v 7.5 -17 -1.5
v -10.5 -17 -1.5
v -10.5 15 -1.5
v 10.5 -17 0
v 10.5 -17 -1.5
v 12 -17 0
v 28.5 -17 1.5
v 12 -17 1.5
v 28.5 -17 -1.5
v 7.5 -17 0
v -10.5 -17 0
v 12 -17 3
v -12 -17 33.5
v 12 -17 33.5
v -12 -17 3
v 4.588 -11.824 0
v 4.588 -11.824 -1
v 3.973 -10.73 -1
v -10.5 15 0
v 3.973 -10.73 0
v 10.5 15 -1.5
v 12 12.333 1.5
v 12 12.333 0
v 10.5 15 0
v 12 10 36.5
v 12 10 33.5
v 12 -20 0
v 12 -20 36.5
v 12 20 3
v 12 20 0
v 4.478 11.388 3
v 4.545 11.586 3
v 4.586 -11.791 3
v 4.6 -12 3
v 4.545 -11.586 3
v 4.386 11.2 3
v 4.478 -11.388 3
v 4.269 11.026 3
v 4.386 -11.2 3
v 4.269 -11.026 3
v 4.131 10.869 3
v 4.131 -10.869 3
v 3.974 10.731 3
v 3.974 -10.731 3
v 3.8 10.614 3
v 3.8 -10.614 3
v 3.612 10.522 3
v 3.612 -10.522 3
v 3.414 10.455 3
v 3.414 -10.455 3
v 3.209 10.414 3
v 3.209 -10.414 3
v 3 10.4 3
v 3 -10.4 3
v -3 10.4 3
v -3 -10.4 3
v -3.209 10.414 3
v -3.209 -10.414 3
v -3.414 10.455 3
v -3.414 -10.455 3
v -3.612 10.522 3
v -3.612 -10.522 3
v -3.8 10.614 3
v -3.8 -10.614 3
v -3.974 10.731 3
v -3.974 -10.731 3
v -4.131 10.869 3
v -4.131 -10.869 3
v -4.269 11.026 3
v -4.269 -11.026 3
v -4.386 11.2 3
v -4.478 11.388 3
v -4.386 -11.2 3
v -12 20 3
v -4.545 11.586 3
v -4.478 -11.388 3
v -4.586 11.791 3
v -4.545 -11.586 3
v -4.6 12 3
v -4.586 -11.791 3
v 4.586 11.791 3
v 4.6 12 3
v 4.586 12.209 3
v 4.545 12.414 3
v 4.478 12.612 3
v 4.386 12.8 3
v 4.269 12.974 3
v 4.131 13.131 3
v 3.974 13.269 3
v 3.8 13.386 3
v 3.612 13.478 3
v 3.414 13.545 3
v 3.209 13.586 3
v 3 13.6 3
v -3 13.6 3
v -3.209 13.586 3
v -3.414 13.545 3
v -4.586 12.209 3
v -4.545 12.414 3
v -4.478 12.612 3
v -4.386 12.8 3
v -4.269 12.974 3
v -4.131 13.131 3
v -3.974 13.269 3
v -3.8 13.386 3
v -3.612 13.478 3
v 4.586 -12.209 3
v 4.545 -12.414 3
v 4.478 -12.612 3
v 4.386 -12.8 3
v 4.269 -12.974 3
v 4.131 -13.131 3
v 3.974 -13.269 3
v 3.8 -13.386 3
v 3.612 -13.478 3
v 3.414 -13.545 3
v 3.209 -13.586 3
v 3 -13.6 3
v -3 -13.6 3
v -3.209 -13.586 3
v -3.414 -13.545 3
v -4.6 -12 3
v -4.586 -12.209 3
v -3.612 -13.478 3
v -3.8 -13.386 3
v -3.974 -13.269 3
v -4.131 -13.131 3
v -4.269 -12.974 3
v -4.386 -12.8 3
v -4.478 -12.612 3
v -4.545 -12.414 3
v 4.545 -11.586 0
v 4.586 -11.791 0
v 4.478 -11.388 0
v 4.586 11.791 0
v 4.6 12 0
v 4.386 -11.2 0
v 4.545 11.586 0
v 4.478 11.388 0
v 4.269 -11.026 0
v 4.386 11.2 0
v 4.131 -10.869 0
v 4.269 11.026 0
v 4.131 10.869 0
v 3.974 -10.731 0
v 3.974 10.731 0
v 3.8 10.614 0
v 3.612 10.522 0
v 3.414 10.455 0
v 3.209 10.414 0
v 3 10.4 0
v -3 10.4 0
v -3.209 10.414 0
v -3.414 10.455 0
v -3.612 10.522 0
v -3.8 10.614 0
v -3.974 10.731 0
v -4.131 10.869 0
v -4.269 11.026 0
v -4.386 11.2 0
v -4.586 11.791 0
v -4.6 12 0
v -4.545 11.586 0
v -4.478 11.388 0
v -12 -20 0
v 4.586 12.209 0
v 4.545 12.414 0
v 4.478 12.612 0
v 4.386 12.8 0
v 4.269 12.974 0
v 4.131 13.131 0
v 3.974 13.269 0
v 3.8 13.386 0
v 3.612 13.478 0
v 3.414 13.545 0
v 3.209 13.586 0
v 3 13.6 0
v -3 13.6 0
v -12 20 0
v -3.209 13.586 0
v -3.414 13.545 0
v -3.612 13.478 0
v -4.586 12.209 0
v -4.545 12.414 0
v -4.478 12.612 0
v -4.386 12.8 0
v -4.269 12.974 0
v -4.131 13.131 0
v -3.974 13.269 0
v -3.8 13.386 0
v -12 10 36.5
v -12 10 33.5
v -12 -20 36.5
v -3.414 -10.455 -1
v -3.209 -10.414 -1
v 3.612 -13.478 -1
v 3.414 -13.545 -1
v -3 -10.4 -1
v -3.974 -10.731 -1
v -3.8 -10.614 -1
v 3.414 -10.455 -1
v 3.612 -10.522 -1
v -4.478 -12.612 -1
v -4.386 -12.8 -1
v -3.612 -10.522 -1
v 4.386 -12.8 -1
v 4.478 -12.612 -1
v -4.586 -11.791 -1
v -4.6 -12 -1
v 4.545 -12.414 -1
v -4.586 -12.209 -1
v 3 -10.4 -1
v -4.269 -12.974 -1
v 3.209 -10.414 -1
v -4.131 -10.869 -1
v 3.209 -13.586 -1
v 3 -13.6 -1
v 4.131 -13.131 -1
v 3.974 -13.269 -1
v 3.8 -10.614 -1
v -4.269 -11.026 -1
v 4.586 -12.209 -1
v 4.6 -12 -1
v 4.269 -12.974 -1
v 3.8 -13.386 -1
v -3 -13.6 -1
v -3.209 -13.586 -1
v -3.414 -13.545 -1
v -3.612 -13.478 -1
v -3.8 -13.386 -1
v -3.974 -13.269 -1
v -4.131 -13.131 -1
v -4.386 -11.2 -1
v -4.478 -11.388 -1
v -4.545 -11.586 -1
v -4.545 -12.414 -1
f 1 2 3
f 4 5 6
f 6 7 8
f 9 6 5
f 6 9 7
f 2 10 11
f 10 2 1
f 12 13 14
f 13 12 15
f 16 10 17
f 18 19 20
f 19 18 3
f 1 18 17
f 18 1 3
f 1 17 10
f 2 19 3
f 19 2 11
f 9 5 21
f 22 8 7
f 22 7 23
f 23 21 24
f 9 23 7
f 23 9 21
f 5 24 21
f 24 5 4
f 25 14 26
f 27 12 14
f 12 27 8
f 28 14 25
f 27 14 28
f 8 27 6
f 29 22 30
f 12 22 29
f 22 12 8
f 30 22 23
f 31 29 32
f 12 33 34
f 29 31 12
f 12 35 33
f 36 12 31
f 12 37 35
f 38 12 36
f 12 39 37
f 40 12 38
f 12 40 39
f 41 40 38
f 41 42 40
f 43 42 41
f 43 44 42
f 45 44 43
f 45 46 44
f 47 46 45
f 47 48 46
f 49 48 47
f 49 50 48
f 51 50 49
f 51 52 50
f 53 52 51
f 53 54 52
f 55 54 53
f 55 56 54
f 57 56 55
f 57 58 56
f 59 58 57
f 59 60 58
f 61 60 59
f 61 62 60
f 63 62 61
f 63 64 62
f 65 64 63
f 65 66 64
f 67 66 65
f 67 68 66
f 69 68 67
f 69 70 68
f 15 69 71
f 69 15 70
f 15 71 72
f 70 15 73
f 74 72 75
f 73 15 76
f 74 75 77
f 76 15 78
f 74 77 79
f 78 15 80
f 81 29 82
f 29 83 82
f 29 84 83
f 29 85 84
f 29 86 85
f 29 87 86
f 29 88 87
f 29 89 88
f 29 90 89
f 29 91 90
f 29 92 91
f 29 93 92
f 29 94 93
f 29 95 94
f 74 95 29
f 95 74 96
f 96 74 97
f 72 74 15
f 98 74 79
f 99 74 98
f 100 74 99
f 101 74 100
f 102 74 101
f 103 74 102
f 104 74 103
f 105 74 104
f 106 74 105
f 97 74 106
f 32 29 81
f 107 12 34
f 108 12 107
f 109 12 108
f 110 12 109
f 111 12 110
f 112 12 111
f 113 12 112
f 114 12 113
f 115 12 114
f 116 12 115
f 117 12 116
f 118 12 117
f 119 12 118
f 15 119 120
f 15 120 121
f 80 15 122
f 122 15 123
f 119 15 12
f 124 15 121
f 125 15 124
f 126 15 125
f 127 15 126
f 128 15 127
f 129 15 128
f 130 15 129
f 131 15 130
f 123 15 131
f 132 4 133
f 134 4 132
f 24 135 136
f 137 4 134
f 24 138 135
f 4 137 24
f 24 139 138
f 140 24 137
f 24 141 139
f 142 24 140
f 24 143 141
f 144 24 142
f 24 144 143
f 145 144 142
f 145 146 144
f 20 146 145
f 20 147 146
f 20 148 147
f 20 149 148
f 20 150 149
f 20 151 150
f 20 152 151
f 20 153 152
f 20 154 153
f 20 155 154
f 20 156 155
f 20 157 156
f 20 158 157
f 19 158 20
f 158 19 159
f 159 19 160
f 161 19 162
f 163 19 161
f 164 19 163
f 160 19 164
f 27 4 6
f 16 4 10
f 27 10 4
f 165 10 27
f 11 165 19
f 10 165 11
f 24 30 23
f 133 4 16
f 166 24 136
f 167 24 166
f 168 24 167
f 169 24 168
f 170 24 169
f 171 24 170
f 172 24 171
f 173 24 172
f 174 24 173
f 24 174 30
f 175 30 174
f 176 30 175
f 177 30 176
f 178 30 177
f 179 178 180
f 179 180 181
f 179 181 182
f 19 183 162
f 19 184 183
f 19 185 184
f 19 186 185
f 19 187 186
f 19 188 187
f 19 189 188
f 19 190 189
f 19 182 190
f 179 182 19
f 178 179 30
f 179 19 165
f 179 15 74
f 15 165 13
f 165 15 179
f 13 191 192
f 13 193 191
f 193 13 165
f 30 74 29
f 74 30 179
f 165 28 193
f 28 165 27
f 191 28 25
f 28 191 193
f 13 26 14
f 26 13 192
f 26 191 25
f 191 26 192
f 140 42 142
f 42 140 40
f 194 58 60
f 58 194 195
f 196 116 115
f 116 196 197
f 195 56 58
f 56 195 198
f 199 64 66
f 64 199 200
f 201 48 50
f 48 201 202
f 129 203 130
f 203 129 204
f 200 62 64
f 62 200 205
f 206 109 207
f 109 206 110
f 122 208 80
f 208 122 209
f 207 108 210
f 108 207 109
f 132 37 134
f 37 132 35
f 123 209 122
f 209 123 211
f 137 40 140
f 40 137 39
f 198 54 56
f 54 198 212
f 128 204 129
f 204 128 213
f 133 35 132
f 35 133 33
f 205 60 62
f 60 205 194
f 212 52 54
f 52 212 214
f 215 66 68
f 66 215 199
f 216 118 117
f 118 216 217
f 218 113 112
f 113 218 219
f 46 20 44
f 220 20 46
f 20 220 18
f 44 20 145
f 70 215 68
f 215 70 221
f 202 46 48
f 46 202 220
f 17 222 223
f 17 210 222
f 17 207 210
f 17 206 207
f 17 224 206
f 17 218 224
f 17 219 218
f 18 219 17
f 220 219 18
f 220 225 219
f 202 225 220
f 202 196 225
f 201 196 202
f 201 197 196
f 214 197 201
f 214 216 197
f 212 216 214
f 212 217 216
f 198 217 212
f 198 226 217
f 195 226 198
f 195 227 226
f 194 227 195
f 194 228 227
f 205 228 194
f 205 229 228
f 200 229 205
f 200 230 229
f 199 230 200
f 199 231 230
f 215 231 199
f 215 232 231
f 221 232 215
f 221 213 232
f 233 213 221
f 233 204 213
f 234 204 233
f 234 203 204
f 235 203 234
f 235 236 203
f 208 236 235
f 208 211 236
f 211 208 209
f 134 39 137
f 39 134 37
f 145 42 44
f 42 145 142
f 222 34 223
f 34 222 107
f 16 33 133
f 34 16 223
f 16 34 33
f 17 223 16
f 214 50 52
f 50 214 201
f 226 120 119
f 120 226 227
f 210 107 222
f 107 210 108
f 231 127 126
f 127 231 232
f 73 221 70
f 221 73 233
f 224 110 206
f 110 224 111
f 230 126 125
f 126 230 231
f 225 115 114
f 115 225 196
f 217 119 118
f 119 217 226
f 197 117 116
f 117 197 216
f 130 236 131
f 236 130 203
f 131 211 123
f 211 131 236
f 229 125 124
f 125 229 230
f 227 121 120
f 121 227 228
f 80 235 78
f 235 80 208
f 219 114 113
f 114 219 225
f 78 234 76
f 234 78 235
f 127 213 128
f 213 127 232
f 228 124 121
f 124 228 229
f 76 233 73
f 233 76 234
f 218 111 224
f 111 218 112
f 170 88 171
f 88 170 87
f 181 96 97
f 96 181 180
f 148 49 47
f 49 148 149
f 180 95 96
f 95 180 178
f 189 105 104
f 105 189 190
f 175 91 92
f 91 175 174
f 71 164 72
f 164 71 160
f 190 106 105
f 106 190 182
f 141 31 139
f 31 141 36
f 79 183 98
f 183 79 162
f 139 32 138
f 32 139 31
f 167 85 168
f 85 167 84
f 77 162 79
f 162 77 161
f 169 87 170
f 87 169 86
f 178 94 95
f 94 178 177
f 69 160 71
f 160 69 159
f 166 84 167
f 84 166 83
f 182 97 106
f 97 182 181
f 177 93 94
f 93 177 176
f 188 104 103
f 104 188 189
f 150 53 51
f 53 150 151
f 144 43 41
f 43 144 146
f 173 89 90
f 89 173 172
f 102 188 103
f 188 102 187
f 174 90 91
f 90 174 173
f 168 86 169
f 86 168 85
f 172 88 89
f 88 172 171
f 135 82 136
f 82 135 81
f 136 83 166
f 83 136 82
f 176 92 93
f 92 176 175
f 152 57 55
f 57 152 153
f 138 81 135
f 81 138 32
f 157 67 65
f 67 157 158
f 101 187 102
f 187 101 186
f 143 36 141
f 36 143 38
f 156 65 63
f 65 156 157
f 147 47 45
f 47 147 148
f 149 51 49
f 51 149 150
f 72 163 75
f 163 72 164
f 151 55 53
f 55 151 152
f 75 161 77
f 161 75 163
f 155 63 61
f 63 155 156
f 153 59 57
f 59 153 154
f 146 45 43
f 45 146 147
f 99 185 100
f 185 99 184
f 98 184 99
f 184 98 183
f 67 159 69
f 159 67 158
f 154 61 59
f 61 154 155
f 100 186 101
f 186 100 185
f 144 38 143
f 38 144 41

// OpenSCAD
// encoder_bracket.scad — holds an LM393 slot sensor against the encoder disc
//
// Open in OpenSCAD, set the numbers from your own hardware, F5 to preview,
// F6 then Export as STL.
//
// GEOMETRY — get this clear before touching the numbers:
//
//   The disc is on the axle, so it spins in a VERTICAL plane. The sensor's
//   two posts must sit either side of that plane, with the beam crossing the
//   slotted ring. So the sensor PCB lies FLAT (posts pointing up) somewhere
//   below the axle, and the bottom edge of the disc dips down into the gap.
//
//        axle  ●
//              |
//         ,----+----.        <- disc, vertical, spinning
//        (           )
//         `----+----'
//          ║   |   ║         <- sensor posts, disc passing between them
//        ──╨───┴───╨──       <- sensor PCB, flat
//            shelf
//            │
//            │ upright
//          ──┴──  base -> chassis
//
// Every hole is a SLOT, because getting this right first try does not happen.
// Loosen, nudge, retighten.

// ---------------------------------------------------------------- measure these
// Sensor PCB — measure centre-to-centre between its two mounting holes.
sensor_hole_spacing = 28;    // mm
sensor_hole_d       = 3.2;   // M3 clearance

// How high the sensor PCB must sit above the chassis surface it bolts to.
// = (axle height) - (disc radius) + (depth from PCB up to the beam)
// Measure the last one: it is how far the beam sits above the PCB, often 8-12mm.
shelf_height        = 35;    // mm

// How far the shelf reaches out from the upright, to get under the disc.
shelf_reach         = 30;    // mm

// Chassis mounting — spacing of the two bolts holding this bracket down.
base_hole_spacing   = 24;    // mm
base_hole_d         = 3.2;   // M3 clearance

// ---------------------------------------------------------------- build
wall       = 3;      // plate thickness. 3mm in PLA is stiff enough
width      = 24;     // bracket width
slot_range = 6;      // how far each slot lets you slide things, mm
$fn        = 48;

// A slot: a hole you can slide along. Oriented along X.
module slot(d, travel, h) {
    hull() {
        translate([-travel/2, 0, 0]) cylinder(d = d, h = h, center = true);
        translate([ travel/2, 0, 0]) cylinder(d = d, h = h, center = true);
    }
}

module bracket() {
    difference() {
        union() {
            // base — bolts to the chassis
            translate([0, 0, wall/2])
                cube([width, base_hole_spacing + 16, wall], center = true);

            // upright
            translate([0, -(base_hole_spacing + 16)/2 + wall/2, shelf_height/2])
                cube([width, wall, shelf_height], center = true);

            // shelf — sensor sits here
            translate([0, -(base_hole_spacing + 16)/2 + shelf_reach/2, shelf_height])
                cube([width, shelf_reach, wall], center = true);

            // gussets, so the shelf does not flex and let the disc touch a post
            for (s = [-1, 1])
                translate([s * (width/2 - wall/2), 0, 0])
                    rotate([0, 0, 0])
                    translate([0, -(base_hole_spacing + 16)/2 + wall, 0])
                    linear_extrude(wall, center = true)
                        polygon([[0,0], [0, shelf_height - wall],
                                 [shelf_reach * 0.6, 0]]);
        }

        // chassis bolt slots — slide fore/aft
        for (s = [-1, 1])
            translate([0, s * base_hole_spacing/2, wall/2])
                slot(base_hole_d, slot_range, wall + 2);

        // sensor bolt slots — slide the sensor toward/away from the disc
        for (s = [-1, 1])
            translate([s * sensor_hole_spacing/2,
                       -(base_hole_spacing + 16)/2 + shelf_reach/2,
                       shelf_height])
                rotate([0, 0, 90])
                    slot(sensor_hole_d, slot_range, wall + 2);
    }
}

bracket();

// ---------------------------------------------------------------- notes
//
// PRINTING
//   Layer height 0.2, walls 3, infill 30%, no supports if printed base-down.
//   Print ONE, check it against the real wheel and sensor, then print the
//   second. The first one is a measuring tool.
//
// IF THE GEOMETRY IS WRONG
//   shelf too low  -> disc never reaches the beam, no pulses
//   shelf too high -> disc bottoms out on the PCB, or rubs a post
//   Both are fixed by changing shelf_height and reprinting, which is why the
//   first print is cheap and small.
//
// THE THING THAT ACTUALLY MATTERS
//   The disc must pass through the gap WITHOUT TOUCHING, with the slots
//   crossing the beam. Spin the wheel by hand and watch for wobble before
//   you bolt anything down permanently.
